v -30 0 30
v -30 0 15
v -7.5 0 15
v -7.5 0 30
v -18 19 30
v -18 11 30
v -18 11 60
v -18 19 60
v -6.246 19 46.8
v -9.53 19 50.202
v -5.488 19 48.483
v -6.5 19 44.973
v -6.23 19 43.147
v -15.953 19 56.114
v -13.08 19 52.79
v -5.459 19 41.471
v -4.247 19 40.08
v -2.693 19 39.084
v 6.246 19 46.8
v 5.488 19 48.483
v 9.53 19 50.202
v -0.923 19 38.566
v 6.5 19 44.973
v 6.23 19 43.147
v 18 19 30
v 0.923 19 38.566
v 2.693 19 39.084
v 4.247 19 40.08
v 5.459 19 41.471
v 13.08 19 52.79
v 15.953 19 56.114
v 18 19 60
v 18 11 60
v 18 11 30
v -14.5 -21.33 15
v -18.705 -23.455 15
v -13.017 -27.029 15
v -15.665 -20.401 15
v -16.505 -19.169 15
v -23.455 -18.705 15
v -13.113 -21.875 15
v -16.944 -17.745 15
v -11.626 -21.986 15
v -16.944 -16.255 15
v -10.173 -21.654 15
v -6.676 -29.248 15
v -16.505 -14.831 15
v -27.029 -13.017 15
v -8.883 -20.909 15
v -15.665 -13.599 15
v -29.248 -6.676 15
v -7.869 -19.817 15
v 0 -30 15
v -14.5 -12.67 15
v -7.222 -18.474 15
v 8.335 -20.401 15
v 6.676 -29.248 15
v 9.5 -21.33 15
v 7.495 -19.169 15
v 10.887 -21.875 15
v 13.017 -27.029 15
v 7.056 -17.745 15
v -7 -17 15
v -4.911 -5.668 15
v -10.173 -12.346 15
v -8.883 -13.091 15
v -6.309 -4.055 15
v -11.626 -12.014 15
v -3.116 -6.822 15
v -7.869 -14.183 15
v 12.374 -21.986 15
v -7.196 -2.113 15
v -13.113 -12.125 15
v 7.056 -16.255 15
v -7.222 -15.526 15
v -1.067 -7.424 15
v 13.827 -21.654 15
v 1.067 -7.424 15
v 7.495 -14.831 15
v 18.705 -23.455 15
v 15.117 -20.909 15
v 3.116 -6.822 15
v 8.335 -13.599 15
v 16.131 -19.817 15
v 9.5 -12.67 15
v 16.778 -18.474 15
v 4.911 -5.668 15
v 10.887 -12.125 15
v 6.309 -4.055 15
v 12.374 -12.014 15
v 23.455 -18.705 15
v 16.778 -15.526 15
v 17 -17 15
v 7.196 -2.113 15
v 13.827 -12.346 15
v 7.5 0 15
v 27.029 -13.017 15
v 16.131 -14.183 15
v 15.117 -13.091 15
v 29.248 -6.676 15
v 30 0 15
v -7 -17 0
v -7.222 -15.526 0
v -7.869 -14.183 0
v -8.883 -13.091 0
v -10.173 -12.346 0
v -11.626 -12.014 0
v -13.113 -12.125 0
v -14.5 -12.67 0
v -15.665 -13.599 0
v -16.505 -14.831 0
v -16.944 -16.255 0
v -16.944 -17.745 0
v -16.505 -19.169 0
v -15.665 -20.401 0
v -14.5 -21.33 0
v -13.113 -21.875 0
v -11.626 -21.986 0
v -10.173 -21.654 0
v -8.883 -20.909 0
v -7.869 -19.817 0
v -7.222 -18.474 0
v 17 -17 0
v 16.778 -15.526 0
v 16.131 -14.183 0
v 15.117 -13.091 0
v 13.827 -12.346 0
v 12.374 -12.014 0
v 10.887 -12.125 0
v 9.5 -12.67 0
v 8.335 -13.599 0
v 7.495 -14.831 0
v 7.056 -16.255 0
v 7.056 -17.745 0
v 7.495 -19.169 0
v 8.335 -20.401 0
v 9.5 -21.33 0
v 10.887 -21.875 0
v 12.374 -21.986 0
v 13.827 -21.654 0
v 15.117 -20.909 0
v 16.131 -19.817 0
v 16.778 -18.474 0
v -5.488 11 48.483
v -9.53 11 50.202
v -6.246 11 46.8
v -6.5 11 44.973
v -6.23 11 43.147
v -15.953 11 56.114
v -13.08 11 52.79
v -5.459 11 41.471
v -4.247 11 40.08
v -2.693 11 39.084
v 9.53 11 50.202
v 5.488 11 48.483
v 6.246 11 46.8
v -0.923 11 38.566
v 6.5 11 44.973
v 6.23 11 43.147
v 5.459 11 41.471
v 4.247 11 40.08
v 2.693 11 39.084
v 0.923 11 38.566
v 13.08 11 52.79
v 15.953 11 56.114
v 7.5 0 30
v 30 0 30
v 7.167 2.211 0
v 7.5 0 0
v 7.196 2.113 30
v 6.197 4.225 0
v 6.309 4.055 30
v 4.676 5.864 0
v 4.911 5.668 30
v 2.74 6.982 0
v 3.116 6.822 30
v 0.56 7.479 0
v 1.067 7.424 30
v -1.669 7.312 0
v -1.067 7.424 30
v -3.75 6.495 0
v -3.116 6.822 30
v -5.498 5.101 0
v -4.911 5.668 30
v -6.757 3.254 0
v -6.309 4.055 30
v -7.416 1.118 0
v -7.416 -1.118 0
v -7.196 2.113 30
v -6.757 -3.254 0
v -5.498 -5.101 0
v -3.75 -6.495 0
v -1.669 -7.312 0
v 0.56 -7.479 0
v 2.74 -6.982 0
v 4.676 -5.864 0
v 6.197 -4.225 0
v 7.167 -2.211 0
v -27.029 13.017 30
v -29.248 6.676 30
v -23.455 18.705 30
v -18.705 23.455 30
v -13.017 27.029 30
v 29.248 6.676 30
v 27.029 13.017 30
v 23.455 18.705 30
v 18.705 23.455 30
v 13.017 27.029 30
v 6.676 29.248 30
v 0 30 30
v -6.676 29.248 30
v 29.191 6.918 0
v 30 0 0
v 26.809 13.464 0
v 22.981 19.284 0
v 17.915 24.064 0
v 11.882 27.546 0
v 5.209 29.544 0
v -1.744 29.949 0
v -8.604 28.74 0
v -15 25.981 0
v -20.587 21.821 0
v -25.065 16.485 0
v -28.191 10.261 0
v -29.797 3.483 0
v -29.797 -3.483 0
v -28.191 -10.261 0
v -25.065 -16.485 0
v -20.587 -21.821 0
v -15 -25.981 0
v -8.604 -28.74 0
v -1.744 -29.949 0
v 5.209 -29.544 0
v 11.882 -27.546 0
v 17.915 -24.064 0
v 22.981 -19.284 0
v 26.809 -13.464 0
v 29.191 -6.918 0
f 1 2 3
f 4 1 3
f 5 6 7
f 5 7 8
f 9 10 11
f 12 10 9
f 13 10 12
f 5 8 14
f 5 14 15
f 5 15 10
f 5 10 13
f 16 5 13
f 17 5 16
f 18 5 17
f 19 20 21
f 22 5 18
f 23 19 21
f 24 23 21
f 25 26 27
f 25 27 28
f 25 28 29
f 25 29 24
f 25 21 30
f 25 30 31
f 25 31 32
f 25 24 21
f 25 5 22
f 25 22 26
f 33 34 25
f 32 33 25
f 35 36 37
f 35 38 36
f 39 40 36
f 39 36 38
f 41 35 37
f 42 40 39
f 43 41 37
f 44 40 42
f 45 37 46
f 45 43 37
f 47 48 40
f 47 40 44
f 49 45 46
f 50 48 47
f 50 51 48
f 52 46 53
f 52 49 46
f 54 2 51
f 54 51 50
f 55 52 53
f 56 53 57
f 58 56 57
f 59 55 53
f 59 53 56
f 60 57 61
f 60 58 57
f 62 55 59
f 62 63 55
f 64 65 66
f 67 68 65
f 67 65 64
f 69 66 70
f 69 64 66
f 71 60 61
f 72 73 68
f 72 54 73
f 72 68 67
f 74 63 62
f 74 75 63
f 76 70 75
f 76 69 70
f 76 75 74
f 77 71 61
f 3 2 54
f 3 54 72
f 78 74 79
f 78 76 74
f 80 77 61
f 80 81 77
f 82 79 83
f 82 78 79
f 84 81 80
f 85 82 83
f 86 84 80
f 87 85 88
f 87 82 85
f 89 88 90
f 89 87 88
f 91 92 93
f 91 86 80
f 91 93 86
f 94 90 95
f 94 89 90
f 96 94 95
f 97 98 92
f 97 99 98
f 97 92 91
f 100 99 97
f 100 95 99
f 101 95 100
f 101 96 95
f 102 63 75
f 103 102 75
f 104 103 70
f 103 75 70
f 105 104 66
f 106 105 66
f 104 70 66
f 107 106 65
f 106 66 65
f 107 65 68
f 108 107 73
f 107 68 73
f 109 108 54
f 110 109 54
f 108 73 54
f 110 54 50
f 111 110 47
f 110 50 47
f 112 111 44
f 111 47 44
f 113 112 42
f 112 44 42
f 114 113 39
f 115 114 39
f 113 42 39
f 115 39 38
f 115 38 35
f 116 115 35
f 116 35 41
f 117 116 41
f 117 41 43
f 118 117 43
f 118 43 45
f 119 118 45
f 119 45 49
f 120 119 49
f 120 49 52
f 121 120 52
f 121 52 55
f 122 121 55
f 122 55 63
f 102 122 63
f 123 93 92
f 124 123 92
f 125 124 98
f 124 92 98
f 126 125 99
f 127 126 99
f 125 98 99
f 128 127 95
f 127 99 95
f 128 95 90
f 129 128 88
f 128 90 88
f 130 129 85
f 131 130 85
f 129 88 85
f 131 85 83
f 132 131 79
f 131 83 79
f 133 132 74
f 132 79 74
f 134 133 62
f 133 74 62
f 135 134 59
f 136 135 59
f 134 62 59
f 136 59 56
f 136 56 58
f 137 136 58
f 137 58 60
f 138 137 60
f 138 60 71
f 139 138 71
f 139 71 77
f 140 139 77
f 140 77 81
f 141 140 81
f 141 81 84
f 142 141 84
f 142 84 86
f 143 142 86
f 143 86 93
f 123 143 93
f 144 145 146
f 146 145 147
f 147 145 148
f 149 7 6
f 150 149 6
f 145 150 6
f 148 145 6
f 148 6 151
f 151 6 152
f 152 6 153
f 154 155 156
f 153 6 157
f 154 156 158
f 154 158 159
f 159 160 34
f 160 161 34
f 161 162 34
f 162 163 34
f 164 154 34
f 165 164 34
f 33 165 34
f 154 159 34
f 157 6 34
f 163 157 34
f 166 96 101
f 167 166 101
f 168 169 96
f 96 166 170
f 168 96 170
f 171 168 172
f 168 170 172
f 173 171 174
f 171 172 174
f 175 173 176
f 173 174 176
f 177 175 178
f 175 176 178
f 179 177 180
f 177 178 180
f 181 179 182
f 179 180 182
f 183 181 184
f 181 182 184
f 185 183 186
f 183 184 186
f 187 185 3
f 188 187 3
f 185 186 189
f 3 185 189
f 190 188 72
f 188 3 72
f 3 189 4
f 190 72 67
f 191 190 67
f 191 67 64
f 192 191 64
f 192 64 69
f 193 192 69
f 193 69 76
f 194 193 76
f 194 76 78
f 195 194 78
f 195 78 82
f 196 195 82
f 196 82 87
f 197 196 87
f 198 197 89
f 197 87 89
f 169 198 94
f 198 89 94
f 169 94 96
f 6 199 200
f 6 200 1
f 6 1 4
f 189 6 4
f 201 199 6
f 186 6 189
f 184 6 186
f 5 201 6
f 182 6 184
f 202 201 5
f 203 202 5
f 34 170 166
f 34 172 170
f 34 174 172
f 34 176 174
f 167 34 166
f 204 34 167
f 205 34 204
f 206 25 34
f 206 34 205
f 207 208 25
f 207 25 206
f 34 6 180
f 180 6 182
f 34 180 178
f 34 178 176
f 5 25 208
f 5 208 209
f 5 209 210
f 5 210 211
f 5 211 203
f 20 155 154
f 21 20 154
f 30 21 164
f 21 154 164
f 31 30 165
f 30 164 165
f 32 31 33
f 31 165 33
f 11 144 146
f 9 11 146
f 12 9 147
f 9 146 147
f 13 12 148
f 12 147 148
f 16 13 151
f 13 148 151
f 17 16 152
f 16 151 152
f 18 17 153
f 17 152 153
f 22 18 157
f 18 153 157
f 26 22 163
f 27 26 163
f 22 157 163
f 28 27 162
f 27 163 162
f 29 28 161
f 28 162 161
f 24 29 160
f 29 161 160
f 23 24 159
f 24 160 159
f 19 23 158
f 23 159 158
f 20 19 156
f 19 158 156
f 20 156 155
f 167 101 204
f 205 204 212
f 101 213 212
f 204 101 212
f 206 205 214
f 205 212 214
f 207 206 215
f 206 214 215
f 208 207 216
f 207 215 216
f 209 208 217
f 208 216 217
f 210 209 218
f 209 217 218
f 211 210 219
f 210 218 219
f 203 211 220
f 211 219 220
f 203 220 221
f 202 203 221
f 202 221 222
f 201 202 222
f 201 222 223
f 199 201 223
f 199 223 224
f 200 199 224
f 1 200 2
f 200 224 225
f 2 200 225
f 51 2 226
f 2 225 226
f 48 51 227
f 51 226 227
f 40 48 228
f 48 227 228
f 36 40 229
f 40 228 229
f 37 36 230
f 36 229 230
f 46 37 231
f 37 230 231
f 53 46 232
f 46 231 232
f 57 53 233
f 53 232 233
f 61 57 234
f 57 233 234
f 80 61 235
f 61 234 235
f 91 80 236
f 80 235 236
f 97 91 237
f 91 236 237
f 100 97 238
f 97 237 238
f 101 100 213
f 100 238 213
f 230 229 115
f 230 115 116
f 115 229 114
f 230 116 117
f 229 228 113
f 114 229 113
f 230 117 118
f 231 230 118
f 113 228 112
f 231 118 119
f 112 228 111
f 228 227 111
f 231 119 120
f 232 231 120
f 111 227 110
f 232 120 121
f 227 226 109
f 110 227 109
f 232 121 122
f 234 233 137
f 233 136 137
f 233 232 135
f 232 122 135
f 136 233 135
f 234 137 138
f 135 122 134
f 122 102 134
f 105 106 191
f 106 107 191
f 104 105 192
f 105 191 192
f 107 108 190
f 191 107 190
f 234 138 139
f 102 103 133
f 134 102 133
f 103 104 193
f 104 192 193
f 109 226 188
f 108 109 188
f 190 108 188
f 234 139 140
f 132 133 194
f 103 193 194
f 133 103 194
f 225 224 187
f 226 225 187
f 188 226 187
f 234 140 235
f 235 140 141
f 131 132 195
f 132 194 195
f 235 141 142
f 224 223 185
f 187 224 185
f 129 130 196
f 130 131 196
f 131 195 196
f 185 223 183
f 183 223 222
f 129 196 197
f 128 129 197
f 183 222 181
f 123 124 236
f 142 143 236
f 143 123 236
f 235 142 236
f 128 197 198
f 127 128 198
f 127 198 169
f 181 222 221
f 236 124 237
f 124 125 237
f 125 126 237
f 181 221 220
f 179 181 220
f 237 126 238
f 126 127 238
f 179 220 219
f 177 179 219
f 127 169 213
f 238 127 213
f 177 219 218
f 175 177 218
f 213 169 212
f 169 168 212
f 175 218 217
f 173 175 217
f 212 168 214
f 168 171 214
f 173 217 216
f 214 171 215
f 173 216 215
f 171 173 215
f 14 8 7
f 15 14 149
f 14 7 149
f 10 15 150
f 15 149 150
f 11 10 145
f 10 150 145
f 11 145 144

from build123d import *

# Parameters (mm, degrees)
SKETCH_1_R          = 30
EXTRUDE_1_DEPTH     = 15
EXTRUDE_2_DEPTH     = 15
SKETCH_3_R          = 7.5
CUT_EXTRUDE_1_DEPTH = 52.961524227
SKETCH_4_W          = 36
SKETCH_4_H          = 8
EXTRUDE_3_DEPTH     = 30
SKETCH_6_R          = 6.5
CUT_EXTRUDE_3_DEPTH = 79.619336044
SKETCH_5_R          = 19.313207916
CUT_EXTRUDE_4_DEPTH = 79.619336044
SKETCH_7_R          = 5
CUT_EXTRUDE_5_DEPTH = 62.846584384


with BuildPart() as part:
    # Эскиз1 → Бобышка-Вытянуть1 (new body)
    with BuildSketch(Plane.XY):
        Circle(SKETCH_1_R)
    extrude(amount=EXTRUDE_1_DEPTH)

    # Эскиз2 → Бобышка-Вытянуть2 (add)
    with BuildSketch(Plane.XY.offset(15)):
        with BuildLine():
            Line((-30, 0), (30, 0))
            ThreePointArc((30, 0), (0, 30), (-30, 0))
        make_face()
    extrude(amount=EXTRUDE_2_DEPTH)

    # Эскиз3 → Вырез-Вытянуть1 (cut, through all)
    with BuildSketch(Plane.XY.offset(30)):
        Circle(SKETCH_3_R)
    extrude(amount=-CUT_EXTRUDE_1_DEPTH, mode=Mode.SUBTRACT)

    # Эскиз4 → Бобышка-Вытянуть3 (add)
    with BuildSketch(Plane.XY.offset(30)):
        with Locations((0, 15)):
            Rectangle(SKETCH_4_W, SKETCH_4_H)
    extrude(amount=EXTRUDE_3_DEPTH)

    # Эскиз6 → Вырез-Вытянуть3 (cut, through all)
    with BuildSketch(Plane(origin=(0, 11, 0), x_dir=(-1, 0, 0), z_dir=(0, -1, 0))):
        with Locations(Location((0, -45, 0), (0, 0, 90))):
            Circle(SKETCH_6_R)
    extrude(amount=-CUT_EXTRUDE_3_DEPTH, mode=Mode.SUBTRACT)

    # Эскиз5 → Вырез-Вытянуть4 (cut, through all)
    with BuildSketch(Plane(origin=(0, 11, 0), x_dir=(-1, 0, 0), z_dir=(0, -1, 0))):
        with Locations((0, -67)):
            Circle(SKETCH_5_R)
    extrude(amount=-CUT_EXTRUDE_4_DEPTH, mode=Mode.SUBTRACT)

    # Эскиз7 → Вырез-Вытянуть5 (cut, through all)
    with BuildSketch(Plane.XY.offset(15)):
        with Locations((-12, -17)):
            Circle(SKETCH_7_R)
        with Locations((12, -17)):
            Circle(SKETCH_7_R)
    extrude(amount=-CUT_EXTRUDE_5_DEPTH, mode=Mode.SUBTRACT)


solid = part.part
